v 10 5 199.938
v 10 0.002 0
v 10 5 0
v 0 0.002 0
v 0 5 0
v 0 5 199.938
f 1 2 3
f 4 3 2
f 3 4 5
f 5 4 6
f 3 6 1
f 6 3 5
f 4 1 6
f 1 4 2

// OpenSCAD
width = 5;
height = 200;

difference() {
	cube([10, width, height]);
	translate([0, -width, 0]) {
		rotate([-atan(width / height), 0, 0]) {
			cube([10, width, height + width]);
		}
	}
}
